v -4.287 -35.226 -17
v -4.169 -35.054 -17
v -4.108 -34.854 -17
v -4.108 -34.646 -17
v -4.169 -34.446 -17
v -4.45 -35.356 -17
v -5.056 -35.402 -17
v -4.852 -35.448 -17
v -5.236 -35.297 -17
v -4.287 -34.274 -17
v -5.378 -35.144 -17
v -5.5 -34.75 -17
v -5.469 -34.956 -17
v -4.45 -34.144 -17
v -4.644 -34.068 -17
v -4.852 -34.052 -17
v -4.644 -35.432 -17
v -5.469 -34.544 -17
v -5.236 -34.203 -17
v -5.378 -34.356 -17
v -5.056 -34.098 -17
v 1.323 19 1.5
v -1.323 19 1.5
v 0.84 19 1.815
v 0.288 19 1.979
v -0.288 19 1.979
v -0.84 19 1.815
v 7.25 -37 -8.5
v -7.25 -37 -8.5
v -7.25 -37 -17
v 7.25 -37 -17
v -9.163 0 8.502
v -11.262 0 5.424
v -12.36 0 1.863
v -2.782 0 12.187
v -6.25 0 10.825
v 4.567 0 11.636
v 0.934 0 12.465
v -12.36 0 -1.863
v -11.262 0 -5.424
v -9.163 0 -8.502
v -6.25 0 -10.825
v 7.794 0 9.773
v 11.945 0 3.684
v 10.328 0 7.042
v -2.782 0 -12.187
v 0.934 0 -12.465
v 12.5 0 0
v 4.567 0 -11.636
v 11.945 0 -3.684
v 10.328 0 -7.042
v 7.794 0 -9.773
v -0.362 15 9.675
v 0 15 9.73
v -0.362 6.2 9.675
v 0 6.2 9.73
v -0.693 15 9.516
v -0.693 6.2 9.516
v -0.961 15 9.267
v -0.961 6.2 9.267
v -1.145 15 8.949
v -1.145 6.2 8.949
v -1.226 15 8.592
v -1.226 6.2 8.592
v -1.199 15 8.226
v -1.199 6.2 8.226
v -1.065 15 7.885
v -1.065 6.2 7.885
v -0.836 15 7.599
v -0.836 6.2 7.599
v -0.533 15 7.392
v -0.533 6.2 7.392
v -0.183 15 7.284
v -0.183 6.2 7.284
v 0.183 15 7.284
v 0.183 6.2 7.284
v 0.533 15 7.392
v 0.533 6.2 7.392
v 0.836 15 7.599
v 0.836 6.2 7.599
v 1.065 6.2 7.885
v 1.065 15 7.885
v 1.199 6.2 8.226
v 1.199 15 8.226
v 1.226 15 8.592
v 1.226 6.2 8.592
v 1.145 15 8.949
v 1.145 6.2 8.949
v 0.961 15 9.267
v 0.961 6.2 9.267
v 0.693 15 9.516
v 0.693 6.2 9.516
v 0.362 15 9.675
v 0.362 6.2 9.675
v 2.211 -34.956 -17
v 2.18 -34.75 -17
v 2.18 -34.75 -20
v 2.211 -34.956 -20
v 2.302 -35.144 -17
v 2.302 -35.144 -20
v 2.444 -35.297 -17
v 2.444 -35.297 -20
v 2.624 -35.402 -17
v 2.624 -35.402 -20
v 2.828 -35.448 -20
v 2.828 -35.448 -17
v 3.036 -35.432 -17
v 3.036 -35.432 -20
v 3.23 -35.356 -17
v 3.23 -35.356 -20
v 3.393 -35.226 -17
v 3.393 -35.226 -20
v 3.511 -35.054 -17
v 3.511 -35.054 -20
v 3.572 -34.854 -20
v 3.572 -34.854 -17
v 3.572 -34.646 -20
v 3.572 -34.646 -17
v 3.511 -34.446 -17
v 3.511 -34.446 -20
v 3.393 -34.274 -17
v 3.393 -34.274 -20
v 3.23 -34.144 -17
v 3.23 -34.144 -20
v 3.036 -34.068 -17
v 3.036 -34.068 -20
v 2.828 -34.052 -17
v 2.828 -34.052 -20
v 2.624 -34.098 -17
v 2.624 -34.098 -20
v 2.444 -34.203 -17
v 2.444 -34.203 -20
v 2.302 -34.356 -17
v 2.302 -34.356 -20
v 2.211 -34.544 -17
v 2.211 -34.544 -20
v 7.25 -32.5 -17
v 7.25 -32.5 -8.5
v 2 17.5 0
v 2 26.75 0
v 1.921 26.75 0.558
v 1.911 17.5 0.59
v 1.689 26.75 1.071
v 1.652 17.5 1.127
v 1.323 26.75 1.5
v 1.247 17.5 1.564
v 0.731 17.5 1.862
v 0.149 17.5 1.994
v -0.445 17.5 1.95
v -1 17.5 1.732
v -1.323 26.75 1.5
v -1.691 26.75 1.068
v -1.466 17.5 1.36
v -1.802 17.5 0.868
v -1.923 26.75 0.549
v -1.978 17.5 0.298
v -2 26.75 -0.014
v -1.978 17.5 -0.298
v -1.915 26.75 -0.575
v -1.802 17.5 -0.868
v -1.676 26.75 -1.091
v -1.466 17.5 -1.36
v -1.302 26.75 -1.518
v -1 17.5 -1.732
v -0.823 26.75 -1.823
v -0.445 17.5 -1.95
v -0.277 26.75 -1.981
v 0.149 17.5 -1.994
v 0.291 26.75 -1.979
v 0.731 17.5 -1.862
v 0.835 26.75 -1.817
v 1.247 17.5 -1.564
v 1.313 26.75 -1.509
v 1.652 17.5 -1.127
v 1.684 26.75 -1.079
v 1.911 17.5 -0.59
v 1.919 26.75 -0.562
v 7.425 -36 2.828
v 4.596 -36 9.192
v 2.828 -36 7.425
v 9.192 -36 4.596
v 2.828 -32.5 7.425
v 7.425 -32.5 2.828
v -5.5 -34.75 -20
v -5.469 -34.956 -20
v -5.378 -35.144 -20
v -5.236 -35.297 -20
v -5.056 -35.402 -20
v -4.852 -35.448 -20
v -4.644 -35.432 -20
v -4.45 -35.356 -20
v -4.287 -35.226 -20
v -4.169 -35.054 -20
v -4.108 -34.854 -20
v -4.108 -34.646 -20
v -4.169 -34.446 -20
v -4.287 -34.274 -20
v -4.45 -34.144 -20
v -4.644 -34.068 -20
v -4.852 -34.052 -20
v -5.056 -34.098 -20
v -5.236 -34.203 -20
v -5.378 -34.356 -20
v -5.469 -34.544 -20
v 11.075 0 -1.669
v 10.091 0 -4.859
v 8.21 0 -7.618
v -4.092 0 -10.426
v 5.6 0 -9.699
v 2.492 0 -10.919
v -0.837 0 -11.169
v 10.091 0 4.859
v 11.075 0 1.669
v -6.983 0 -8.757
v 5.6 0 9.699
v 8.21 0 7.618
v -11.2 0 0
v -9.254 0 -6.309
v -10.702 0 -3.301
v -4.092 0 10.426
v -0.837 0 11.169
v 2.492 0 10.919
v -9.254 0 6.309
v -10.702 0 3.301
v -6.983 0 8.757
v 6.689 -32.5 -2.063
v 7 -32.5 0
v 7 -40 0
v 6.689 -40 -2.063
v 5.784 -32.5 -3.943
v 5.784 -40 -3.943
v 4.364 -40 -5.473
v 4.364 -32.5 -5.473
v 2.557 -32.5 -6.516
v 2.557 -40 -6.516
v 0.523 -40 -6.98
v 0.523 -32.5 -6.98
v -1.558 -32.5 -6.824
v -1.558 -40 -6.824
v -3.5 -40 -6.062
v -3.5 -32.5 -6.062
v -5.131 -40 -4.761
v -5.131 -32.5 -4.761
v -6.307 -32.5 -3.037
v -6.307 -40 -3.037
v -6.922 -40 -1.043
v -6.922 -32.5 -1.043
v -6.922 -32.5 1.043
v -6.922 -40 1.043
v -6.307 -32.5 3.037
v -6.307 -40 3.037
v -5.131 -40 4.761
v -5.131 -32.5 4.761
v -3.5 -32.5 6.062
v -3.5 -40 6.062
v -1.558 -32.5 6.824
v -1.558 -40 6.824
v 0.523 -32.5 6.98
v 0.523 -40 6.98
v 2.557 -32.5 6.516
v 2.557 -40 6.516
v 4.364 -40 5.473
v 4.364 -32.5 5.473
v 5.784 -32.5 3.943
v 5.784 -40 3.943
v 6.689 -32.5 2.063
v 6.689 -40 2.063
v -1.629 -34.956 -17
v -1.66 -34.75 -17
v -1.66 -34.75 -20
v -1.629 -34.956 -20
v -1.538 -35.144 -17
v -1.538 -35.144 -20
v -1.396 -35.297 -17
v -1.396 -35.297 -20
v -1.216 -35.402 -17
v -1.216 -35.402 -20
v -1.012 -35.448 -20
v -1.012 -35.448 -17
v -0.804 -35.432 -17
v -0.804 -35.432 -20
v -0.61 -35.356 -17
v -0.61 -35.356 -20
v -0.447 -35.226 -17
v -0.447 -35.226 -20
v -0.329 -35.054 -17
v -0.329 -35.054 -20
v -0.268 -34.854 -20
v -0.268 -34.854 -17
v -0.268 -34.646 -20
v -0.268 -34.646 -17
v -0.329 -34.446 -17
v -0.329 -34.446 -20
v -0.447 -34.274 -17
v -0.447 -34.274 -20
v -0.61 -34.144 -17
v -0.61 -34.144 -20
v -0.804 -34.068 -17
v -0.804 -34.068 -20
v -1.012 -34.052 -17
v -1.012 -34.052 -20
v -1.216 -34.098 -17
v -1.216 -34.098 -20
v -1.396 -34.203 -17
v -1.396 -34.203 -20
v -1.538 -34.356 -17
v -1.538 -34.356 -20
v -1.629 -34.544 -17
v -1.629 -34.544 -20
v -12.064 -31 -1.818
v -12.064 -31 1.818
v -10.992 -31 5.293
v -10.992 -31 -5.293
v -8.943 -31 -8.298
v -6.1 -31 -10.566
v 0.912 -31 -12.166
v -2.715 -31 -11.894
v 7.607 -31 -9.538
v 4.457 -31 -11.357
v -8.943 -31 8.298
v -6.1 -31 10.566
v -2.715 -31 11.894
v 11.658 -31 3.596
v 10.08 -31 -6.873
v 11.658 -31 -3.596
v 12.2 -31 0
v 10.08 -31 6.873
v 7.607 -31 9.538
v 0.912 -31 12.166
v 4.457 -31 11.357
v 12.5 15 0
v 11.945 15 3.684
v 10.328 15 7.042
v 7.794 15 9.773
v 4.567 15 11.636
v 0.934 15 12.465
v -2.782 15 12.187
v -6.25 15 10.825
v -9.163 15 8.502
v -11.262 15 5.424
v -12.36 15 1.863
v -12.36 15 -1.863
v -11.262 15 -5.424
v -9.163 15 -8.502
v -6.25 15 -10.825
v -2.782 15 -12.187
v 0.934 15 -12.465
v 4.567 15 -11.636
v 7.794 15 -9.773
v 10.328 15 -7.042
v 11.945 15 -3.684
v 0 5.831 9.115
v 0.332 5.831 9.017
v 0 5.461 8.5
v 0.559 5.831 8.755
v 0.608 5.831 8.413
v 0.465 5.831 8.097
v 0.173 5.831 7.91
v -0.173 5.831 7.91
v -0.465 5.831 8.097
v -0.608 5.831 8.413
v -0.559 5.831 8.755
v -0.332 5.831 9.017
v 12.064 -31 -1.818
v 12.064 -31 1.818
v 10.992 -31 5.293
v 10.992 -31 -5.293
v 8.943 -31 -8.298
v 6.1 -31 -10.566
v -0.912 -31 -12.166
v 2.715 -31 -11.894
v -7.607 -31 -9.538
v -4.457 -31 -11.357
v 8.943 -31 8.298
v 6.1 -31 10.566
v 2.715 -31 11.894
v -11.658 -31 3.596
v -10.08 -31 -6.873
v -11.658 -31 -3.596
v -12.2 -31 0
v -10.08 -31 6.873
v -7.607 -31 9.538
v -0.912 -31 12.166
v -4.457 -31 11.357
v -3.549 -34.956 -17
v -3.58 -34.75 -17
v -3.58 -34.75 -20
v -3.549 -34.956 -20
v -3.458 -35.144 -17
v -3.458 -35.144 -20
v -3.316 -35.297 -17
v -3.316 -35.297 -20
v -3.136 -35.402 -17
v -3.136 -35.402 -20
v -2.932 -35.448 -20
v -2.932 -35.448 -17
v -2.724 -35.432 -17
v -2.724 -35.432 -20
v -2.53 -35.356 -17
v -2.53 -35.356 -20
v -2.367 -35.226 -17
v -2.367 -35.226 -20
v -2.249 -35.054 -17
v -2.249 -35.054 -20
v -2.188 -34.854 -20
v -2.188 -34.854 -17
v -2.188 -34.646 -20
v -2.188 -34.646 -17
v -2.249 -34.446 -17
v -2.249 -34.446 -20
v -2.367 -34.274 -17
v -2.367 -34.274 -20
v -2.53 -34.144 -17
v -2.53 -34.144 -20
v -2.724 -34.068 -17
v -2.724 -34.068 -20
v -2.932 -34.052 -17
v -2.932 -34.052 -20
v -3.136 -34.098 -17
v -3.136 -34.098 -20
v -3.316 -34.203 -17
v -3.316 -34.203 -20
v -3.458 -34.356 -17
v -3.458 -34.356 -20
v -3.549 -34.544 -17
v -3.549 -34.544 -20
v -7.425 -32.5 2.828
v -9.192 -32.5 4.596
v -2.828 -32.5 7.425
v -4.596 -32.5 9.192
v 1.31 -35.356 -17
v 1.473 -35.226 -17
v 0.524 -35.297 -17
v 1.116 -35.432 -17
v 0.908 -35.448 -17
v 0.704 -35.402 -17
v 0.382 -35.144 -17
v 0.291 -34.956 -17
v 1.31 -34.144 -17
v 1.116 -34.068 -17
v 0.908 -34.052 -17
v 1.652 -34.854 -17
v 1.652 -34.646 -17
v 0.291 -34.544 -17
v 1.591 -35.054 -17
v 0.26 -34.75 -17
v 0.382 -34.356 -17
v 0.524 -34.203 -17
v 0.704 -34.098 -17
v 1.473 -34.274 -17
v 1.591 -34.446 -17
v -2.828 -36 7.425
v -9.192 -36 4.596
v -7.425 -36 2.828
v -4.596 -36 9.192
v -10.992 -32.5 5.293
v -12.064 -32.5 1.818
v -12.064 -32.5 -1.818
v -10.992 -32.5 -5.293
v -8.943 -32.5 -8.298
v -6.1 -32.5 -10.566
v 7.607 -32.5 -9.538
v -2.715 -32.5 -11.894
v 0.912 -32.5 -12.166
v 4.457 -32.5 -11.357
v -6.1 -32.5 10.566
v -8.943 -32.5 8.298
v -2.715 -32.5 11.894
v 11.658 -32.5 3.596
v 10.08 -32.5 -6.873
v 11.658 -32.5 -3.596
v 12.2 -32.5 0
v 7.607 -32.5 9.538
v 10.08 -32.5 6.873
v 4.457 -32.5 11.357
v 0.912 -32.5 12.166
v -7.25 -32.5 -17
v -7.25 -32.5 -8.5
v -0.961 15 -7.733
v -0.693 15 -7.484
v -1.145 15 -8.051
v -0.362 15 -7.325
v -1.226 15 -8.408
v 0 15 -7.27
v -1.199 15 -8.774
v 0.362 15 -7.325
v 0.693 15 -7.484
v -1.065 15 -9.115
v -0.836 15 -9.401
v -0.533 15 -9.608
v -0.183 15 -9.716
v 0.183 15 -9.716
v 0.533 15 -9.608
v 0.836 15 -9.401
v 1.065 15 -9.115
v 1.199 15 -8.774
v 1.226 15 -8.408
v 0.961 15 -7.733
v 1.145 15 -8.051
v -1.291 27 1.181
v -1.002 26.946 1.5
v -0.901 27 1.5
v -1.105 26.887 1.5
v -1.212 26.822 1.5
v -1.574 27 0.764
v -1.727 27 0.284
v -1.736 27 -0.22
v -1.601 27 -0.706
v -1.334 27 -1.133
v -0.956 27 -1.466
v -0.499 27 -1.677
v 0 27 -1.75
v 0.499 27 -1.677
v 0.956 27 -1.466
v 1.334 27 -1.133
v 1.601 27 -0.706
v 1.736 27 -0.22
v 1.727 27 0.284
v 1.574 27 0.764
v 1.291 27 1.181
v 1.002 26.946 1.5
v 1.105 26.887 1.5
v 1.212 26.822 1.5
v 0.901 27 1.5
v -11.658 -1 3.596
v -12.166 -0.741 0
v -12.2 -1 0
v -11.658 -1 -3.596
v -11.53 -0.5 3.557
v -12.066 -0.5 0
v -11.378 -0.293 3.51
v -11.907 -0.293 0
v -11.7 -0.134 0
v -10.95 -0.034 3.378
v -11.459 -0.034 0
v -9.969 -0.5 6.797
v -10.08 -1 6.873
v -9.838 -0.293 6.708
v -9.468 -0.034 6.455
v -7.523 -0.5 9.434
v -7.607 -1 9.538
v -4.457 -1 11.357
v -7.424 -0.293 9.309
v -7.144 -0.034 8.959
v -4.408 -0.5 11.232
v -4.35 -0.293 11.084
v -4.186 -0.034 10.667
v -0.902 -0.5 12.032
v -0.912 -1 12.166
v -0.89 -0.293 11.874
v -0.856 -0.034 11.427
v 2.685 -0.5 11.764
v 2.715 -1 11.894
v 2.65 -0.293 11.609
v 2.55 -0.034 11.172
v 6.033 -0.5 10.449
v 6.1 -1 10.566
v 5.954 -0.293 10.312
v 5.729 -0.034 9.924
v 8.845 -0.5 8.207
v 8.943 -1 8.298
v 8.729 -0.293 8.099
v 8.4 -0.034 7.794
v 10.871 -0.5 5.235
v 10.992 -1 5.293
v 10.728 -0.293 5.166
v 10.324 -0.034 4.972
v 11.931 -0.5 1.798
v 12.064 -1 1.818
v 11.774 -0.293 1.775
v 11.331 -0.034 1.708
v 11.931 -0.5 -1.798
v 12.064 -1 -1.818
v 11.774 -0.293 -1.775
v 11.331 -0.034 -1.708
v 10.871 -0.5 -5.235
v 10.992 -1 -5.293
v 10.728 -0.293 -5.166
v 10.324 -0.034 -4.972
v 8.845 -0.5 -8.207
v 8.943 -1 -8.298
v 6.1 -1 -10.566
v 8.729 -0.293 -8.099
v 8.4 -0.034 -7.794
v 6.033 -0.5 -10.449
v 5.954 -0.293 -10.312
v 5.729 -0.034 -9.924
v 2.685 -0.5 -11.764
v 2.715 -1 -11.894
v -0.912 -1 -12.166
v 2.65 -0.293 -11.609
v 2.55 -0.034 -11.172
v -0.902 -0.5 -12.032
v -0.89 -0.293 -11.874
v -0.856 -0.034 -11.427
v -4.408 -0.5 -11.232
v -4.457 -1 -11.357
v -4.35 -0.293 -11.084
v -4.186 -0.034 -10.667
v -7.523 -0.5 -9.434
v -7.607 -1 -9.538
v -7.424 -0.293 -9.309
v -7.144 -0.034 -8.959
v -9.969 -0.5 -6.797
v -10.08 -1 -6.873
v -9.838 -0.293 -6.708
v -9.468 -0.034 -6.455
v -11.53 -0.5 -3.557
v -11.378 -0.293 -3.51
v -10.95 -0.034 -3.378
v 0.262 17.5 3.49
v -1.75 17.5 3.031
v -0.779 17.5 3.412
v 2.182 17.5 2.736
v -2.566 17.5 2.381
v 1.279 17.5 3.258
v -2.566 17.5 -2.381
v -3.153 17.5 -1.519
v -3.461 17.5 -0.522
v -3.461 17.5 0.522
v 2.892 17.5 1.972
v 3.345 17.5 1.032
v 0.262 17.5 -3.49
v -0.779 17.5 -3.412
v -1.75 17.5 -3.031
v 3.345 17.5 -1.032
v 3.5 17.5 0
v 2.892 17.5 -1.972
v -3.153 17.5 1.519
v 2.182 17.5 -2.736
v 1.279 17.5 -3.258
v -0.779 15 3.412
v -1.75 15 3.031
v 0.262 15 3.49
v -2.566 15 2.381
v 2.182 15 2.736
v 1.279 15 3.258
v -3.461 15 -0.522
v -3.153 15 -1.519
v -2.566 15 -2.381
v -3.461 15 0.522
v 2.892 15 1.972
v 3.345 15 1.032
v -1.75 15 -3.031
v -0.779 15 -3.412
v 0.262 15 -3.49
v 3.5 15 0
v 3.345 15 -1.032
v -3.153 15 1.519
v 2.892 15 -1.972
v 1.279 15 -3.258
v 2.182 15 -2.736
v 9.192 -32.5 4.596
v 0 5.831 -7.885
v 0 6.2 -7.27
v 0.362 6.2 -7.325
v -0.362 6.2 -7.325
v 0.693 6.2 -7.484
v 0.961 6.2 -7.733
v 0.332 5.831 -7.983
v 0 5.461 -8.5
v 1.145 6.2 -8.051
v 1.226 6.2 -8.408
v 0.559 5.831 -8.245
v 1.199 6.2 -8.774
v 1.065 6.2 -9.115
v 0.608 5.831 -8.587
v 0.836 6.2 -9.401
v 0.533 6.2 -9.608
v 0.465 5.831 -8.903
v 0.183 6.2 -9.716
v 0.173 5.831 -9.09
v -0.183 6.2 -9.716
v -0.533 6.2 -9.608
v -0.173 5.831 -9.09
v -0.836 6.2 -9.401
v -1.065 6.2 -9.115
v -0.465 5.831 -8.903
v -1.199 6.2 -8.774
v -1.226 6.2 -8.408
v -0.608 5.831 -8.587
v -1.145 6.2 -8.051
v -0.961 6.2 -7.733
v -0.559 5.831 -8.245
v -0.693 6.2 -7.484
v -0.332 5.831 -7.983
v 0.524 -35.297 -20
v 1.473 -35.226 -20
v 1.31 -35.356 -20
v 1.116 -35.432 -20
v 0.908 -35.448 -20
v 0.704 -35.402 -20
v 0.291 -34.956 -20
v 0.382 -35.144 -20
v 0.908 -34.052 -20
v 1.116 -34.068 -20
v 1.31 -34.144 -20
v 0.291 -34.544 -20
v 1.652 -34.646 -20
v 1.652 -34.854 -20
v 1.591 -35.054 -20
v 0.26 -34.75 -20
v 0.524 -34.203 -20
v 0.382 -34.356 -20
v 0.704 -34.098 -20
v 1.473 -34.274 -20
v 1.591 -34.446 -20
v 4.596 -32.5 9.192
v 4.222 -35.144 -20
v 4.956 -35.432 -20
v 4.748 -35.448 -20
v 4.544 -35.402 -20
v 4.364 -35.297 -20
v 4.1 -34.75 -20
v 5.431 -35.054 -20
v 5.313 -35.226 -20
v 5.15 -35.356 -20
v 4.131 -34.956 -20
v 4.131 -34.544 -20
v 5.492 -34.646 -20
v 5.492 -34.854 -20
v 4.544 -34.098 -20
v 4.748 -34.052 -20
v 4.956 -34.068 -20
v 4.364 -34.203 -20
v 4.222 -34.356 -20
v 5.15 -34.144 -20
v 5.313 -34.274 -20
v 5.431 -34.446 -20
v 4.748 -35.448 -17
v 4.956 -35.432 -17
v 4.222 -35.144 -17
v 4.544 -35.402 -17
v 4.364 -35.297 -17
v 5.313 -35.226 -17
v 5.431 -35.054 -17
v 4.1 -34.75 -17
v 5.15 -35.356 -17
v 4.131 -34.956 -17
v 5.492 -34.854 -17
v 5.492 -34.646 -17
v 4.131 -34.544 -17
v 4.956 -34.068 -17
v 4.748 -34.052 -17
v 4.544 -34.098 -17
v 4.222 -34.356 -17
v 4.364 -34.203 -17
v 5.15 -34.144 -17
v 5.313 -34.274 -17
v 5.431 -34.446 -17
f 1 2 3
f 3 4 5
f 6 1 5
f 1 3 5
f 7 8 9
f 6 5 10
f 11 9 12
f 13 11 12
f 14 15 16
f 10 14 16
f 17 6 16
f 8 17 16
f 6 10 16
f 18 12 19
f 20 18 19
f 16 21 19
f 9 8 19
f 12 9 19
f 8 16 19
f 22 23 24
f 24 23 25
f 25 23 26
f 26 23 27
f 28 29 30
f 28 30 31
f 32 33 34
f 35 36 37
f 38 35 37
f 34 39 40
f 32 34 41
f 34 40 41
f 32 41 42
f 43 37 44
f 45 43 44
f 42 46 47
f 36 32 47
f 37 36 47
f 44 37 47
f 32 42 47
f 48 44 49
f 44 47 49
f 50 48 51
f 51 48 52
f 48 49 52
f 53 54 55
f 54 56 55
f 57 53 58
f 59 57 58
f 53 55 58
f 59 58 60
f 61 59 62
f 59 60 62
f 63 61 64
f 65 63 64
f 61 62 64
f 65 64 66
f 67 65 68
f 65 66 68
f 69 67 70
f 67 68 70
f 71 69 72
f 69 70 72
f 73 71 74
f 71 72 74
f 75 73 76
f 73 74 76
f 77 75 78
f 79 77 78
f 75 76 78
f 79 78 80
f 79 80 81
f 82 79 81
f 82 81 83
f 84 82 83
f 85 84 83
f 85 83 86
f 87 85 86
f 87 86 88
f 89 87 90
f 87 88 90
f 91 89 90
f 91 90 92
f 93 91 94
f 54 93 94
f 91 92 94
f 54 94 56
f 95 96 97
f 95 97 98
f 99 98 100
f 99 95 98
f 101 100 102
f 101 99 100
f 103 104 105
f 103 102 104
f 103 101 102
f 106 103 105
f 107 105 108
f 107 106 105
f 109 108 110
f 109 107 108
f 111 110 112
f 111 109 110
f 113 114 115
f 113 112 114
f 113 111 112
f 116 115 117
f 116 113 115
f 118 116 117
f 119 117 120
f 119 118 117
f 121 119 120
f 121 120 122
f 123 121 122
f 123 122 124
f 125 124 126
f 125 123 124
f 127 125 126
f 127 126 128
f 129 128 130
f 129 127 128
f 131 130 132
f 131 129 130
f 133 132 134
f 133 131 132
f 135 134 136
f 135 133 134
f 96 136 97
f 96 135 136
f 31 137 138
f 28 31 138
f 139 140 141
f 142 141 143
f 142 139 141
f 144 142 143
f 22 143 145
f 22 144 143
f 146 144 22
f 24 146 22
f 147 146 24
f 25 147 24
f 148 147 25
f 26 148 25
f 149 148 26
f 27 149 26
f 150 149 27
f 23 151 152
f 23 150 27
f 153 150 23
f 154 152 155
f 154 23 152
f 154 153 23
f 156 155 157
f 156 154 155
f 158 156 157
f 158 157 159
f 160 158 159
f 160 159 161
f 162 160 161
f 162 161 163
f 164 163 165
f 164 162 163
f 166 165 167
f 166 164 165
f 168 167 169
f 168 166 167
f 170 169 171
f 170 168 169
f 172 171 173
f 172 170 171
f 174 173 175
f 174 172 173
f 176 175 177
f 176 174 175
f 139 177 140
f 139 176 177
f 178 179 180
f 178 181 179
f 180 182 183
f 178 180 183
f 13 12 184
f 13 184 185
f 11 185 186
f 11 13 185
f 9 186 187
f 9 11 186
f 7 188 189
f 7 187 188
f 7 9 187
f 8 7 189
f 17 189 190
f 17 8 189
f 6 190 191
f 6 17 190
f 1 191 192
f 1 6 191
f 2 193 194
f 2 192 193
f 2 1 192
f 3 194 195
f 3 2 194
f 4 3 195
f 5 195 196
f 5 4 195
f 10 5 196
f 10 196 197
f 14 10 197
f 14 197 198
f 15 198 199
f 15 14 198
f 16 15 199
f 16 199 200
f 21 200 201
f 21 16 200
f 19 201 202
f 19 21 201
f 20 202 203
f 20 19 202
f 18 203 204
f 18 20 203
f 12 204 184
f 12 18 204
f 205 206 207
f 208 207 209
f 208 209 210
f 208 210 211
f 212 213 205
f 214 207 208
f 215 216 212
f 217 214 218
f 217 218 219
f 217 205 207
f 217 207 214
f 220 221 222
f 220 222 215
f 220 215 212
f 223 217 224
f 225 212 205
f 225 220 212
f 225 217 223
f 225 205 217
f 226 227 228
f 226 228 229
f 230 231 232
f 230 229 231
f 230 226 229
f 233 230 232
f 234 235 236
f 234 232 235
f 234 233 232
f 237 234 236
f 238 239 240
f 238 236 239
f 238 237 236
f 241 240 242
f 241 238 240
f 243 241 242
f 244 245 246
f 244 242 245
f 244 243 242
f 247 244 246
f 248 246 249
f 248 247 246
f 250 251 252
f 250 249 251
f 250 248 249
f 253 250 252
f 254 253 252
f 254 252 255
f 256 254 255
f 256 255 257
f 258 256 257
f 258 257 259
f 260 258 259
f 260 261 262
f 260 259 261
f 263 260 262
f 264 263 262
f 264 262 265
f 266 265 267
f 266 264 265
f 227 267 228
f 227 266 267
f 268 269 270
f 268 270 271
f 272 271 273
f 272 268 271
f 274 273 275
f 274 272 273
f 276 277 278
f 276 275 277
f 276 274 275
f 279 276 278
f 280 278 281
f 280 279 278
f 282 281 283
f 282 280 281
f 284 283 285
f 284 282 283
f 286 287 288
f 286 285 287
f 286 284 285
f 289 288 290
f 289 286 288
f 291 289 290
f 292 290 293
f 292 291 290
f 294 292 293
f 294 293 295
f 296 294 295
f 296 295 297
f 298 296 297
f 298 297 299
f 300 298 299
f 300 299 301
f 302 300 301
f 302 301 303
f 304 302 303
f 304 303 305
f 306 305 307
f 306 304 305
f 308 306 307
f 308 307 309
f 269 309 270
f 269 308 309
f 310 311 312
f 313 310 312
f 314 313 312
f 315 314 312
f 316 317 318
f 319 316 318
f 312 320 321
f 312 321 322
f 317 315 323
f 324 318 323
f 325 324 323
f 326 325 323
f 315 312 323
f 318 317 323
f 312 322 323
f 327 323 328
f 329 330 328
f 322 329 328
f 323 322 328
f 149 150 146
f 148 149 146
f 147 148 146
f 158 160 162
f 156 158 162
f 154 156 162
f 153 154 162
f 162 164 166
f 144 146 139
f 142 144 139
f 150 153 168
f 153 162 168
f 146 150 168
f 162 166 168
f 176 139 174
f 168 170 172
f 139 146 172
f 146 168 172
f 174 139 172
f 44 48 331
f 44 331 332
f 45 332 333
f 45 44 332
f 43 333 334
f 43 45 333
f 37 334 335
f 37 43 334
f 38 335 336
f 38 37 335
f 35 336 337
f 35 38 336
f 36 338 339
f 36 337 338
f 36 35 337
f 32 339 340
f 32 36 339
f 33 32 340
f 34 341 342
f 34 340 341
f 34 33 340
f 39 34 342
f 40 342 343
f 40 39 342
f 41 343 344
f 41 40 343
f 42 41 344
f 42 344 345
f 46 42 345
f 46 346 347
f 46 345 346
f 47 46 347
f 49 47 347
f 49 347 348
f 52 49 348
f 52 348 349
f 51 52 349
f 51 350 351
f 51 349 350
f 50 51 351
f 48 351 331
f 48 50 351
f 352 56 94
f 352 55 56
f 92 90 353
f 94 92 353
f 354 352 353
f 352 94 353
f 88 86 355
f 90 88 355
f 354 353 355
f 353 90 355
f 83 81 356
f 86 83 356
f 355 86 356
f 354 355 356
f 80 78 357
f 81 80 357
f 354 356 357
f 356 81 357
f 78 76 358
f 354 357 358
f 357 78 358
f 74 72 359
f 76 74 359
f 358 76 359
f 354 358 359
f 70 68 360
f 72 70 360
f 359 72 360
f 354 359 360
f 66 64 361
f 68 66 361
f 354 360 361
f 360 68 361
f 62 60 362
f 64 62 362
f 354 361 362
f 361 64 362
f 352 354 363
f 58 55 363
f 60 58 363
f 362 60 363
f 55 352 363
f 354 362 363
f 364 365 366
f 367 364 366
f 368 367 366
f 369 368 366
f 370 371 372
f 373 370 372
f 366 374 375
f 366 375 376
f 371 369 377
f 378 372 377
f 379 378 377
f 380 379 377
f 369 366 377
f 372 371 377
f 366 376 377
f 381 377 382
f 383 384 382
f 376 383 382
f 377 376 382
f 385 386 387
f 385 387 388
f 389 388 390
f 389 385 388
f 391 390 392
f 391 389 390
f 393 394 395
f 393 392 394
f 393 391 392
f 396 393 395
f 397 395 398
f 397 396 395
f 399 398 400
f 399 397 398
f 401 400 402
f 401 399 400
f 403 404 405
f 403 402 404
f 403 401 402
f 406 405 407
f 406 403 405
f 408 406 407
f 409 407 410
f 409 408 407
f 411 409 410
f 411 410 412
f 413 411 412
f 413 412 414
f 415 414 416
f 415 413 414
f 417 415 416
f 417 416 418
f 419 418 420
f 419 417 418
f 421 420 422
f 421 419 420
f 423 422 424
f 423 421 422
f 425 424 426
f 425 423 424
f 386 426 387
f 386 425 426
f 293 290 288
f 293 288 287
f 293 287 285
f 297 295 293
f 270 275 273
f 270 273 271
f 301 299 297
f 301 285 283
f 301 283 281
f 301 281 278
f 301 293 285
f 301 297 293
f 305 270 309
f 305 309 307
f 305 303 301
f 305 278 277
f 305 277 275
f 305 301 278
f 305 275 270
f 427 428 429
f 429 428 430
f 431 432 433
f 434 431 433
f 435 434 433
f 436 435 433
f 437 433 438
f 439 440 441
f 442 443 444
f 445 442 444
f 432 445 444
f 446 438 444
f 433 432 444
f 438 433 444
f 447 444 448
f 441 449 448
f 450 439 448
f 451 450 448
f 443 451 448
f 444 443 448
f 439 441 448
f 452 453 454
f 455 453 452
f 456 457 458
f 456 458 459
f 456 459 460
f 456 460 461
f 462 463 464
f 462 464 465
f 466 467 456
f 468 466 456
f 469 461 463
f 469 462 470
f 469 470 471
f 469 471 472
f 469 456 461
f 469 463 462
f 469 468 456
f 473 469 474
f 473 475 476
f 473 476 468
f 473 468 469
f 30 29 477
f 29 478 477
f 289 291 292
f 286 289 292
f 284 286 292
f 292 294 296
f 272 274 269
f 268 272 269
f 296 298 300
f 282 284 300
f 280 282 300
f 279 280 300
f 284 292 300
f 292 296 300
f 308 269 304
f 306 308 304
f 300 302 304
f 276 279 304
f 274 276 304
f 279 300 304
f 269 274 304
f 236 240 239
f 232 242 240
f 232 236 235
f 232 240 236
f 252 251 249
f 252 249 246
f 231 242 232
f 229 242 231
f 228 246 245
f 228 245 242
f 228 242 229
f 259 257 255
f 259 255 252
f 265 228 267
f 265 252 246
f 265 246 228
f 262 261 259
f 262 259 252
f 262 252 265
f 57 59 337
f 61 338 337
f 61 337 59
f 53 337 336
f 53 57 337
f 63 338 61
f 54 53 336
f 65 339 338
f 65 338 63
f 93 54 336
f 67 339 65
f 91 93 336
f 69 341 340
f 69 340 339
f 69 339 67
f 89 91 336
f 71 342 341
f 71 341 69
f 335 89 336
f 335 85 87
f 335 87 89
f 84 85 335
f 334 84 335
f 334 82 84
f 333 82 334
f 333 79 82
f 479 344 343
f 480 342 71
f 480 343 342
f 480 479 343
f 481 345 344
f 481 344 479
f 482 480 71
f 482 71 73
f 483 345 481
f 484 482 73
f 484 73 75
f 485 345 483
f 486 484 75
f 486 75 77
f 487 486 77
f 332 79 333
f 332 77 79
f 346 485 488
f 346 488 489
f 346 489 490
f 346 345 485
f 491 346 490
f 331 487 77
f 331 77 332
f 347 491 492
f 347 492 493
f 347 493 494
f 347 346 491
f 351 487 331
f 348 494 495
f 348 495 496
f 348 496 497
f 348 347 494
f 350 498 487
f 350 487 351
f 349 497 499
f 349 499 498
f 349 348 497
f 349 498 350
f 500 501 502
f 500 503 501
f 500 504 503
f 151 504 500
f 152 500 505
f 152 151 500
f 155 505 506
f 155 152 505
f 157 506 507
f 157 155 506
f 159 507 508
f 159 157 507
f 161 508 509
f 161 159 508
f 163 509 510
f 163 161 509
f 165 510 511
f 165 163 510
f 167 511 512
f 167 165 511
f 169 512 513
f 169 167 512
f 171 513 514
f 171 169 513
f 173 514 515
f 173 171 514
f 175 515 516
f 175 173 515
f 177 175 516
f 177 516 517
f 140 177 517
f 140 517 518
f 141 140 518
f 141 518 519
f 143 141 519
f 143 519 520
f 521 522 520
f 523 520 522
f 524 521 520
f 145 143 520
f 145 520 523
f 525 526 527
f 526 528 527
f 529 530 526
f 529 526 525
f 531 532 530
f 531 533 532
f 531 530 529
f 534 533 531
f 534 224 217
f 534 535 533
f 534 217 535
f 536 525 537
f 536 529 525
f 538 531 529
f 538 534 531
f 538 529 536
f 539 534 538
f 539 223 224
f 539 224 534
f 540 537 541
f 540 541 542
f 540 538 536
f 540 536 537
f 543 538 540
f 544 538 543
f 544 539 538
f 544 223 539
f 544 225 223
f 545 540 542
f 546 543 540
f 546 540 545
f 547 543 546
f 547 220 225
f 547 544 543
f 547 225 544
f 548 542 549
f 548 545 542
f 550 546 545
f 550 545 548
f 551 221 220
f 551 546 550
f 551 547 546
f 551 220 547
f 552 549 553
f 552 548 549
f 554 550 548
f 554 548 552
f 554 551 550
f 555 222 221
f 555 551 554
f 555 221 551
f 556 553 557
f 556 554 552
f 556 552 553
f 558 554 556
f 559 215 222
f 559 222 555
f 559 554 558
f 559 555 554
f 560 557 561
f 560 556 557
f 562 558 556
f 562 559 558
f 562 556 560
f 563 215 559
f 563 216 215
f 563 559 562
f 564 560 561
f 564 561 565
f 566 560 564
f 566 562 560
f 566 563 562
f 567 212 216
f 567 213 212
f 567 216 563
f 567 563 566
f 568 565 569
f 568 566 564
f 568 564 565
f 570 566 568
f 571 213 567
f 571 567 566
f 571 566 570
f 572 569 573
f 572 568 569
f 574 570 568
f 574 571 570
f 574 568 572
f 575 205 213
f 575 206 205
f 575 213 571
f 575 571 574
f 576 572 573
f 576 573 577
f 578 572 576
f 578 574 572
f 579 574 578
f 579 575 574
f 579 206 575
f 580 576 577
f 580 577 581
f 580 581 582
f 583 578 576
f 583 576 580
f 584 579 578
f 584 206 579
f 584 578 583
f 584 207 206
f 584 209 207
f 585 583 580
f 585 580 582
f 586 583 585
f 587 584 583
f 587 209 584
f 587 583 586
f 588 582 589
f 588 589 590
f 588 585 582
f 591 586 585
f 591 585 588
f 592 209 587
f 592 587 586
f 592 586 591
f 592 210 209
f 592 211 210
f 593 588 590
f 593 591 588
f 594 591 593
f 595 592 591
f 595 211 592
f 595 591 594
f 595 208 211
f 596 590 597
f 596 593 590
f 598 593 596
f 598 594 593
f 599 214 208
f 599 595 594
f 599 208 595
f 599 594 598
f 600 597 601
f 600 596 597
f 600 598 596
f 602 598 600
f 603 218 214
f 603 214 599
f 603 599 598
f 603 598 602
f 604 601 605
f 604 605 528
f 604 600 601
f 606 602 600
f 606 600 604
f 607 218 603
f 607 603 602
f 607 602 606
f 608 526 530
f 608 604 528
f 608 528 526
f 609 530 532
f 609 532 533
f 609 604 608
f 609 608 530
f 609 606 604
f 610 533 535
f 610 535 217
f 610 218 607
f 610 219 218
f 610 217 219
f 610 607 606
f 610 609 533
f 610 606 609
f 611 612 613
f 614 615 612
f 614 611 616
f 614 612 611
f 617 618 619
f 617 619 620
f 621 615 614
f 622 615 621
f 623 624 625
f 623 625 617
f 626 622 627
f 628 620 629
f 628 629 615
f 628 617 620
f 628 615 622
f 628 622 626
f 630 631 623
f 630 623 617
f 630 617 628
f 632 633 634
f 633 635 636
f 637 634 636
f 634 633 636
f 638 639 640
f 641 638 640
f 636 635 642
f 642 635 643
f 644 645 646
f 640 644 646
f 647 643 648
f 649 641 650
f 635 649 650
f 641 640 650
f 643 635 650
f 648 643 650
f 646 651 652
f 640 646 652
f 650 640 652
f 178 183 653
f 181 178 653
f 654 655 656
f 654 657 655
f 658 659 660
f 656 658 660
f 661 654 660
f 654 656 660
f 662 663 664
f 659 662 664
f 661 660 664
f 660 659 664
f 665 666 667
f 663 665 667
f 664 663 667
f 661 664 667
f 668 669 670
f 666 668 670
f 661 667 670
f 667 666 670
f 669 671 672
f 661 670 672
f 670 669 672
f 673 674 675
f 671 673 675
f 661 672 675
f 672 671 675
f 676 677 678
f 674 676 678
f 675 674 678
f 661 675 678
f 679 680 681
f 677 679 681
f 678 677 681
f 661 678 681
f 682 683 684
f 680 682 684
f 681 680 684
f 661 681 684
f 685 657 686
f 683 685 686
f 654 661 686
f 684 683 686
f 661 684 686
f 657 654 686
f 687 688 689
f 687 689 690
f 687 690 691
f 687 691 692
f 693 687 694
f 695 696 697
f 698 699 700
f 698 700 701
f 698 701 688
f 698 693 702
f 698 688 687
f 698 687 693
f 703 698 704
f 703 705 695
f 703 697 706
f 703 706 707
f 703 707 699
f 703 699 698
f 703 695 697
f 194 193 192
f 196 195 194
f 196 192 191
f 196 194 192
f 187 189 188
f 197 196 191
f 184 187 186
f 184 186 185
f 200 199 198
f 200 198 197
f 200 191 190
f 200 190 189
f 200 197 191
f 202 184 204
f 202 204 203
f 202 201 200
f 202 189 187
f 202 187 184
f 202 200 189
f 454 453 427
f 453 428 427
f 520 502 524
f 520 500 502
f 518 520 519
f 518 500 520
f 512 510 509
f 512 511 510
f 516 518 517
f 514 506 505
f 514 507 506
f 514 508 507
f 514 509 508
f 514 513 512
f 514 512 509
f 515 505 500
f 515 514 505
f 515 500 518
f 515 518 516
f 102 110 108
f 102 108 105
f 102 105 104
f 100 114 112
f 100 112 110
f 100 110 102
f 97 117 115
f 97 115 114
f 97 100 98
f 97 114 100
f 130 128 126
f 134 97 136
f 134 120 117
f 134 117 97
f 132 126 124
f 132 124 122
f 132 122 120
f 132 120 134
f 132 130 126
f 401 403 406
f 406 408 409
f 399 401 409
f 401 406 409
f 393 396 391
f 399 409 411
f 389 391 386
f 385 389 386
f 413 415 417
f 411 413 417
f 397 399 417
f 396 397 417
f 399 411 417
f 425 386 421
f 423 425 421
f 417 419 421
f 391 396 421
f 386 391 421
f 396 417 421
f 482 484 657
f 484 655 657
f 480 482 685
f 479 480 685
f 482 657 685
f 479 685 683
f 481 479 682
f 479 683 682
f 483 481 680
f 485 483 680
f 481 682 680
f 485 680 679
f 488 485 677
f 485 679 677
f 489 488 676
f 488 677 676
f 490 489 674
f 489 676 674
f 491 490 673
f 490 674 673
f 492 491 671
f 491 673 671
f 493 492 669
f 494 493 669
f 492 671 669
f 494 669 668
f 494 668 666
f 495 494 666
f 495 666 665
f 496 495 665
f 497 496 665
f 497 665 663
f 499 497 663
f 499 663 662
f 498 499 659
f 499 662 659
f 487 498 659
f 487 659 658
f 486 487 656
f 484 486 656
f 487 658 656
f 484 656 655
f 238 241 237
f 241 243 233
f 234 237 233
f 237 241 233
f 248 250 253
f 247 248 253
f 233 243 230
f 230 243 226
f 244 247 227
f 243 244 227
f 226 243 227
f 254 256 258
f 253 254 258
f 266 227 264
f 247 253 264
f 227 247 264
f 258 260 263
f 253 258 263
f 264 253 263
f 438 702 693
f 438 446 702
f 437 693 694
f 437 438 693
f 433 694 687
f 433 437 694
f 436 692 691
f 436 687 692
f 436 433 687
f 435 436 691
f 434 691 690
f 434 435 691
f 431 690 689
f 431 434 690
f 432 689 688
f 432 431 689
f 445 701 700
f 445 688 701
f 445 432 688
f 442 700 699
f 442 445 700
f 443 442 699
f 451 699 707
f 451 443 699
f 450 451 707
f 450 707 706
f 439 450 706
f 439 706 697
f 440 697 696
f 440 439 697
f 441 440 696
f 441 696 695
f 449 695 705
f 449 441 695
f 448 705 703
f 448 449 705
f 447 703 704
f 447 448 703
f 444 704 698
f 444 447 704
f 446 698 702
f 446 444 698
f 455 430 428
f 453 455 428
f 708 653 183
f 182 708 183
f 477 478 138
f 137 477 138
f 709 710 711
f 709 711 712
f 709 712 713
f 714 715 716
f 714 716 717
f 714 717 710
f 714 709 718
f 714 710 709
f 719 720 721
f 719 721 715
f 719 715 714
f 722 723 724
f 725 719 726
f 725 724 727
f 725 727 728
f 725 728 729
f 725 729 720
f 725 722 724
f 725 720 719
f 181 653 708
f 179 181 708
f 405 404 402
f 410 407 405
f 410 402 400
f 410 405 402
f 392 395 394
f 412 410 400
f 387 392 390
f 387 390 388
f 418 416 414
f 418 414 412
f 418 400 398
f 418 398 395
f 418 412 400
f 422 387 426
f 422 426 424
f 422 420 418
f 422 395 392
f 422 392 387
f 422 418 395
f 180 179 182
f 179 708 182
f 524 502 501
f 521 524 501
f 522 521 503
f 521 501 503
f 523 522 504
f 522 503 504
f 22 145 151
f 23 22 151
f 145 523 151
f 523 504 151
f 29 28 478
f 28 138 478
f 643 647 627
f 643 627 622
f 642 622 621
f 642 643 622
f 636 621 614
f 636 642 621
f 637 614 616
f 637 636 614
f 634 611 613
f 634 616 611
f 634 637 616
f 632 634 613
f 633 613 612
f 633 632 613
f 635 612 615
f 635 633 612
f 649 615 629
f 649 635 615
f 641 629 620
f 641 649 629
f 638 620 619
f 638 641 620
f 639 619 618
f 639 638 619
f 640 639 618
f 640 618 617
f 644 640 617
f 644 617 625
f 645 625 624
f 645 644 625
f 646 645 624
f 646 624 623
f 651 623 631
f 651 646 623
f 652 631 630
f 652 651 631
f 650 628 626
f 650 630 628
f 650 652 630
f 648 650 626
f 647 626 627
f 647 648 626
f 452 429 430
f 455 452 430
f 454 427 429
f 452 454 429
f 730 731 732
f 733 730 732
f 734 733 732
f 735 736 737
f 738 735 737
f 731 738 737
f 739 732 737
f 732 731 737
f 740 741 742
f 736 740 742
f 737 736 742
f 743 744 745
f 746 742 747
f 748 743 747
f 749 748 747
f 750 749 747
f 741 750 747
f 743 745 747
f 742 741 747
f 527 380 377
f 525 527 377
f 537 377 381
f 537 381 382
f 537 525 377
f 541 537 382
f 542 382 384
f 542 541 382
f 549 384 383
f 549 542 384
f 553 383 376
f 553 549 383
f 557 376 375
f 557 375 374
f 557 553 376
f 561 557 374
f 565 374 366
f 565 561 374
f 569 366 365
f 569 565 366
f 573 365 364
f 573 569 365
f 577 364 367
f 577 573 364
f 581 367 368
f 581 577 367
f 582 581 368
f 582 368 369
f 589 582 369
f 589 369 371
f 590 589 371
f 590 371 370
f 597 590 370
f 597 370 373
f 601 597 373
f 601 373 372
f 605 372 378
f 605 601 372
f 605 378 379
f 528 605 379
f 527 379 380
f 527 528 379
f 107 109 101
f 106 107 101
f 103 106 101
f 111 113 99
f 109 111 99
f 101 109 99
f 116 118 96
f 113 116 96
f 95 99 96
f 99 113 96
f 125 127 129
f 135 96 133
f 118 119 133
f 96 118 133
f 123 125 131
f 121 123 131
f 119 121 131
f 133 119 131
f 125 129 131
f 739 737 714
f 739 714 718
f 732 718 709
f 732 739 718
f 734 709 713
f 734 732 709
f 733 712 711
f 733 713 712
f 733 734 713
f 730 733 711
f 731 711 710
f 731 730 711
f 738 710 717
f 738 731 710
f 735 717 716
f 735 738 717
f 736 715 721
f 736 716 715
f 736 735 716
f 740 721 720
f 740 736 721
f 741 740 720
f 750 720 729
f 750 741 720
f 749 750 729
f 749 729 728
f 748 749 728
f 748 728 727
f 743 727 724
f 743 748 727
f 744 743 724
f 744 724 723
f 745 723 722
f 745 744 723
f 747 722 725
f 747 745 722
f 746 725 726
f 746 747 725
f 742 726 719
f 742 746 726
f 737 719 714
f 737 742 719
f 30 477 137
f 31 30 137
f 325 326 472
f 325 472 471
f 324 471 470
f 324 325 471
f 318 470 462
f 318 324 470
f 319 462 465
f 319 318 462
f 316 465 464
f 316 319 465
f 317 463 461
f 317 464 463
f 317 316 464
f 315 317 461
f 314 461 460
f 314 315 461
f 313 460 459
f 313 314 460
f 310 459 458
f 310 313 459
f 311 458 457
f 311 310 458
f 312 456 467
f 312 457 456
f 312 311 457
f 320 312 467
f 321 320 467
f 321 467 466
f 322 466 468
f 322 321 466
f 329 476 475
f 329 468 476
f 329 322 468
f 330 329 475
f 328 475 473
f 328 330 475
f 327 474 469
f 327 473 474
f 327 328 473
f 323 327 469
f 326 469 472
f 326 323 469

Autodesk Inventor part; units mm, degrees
ref_plane "YZ Plane" through (0, 0, 0) normal (1, 0, 0) x (0, 1, 0)
ref_plane "XZ Plane" through (0, 0, 0) normal (0, 1, 0) x (-1, 0, 0)
ref_plane "XY Plane" through (0, 0, 0) normal (0, 0, 1) x (1, 0, 0)
sketch "Sketch1" plane through (0, 0, 0) normal (0, 1, 0) x (-1, 0, 0)
  circle A0 centre (0, 0) radius 12.2
  dimension "d0" = 24.4
extrude "Extrusion1" add sketch "Sketch1" against normal blind 31
fillet "Fillet1" radius 1 1 edges at (12.2, 0, 0)
sketch "Sketch2" plane through (0, -31, 0) normal (0, -1, 0) x (1, 0, 0)
  circle A0 centre (0, 0) radius 12.2 projected
extrude "Extrusion2" add sketch "Sketch2" along normal blind 1.5 separate body
sketch "Sketch3" plane through (0, -32.5, 0) normal (0, -1, 0) x (1, 0, 0)
  circle A0 centre (0, 0) radius 7
  dimension "d6" = 14
extrude "Extrusion3" add sketch "Sketch3" along normal blind 7.5 separate body
sketch "Sketch4" plane through (0, -32.5, 0) normal (0, -1, 0) x (1, 0, 0)
  circle A0 centre (0, 0) radius 6.75 construction
  line L0 (-7.4246, 2.8284) -> (-2.8284, 7.4246)
  line L1 (-2.8284, 7.4246) -> (-4.5962, 9.1924)
  line L2 (-4.5962, 9.1924) -> (-9.1924, 4.5962)
  line L3 (-9.1924, 4.5962) -> (-7.4246, 2.8284)
  line L4 (-7.4246, 2.8284) -> (-4.5962, 9.1924) construction
  line L5 (-2.8284, 7.4246) -> (-9.1924, 4.5962) construction
  line L6 (0, 0) -> (-6.0104, 6.0104) construction
  line L7 (0, 0) -> (-12.2, 0) construction
  circle A1 centre (0, 0) radius 12.2 construction
  point P0 (4.773, -4.773)
  dimension "d9" = 13.5
  dimension "d10" = 6.5
  dimension "d11" = 2.5
  dimension "d12" = 45
  dimension "d13" = 16.5
extrude "Extrusion4" add sketch "Sketch4" along normal blind 3.5 separate body
pattern_circular "Circular Pattern1" count 2 over 90 about axis through (0, -32.5, 0) along (0, 1, 0) of "Extrusion4" bodies 4
sketch "Sketch5" plane through (0, -32.5, 0) normal (0, -1, 0) x (1, 0, 0)
  line L0 (-7.25, -17) -> (7.25, -17)
  line L1 (7.25, -17) -> (7.25, -8.5)
  line L2 (7.25, -8.5) -> (-7.25, -8.5)
  line L3 (-7.25, -8.5) -> (-7.25, -17)
  line L4 (-7.25, -17) -> (7.25, -8.5) construction
  line L5 (7.25, -17) -> (-7.25, -8.5) construction
  circle A0 centre (0, 0) radius 7 projected
  point P0 (0, -12.75)
  point P1 (0, -12.75)
  dimension "d19" = 17
  dimension "d20" = 8.5
  dimension "d21" = 14.5
extrude "Extrusion5" add sketch "Sketch5" along normal blind 4.5 separate body contours L3 L2 L1 L0
sketch "Sketch6" plane through (7.25, -32.5, -17) normal (0, 0, -1) x (-1, 0, 0)
  line L0 (12.05, -2.25) -> (10.13, -2.25) construction
  line L1 (10.13, -2.25) -> (8.21, -2.25) construction
  line L2 (8.21, -2.25) -> (6.29, -2.25) construction
  line L3 (6.29, -2.25) -> (4.37, -2.25) construction
  line L4 (4.37, -2.25) -> (2.45, -2.25) construction
  circle A0 centre (12.05, -2.25) radius 0.7
  circle A1 centre (10.13, -2.25) radius 0.7
  circle A2 centre (8.21, -2.25) radius 0.7
  circle A3 centre (6.29, -2.25) radius 0.7
  circle A4 centre (4.37, -2.25) radius 0.7
  circle A5 centre (2.45, -2.25) radius 0.7
  line L5 (14.5, 0) -> (14.5, -4.5) projected
  line L6 (14.5, -4.5) -> (0, -4.5) projected
  point P0 (7.25, 32.5)
  point P1 (14.5, -2.25)
  point P2 (7.25, -2.25)
  point P3 (7.25, -4.5)
  dimension "d24" = 9.6
  dimension "d25" = 1.4
extrude "Extrusion6" add sketch "Sketch6" along normal blind 3 separate body contours A0
extrude "Extrusion7" add sketch "Sketch6" along normal blind 3 separate body contours A1
extrude "Extrusion8" add sketch "Sketch6" along normal blind 3 separate body contours A2
extrude "Extrusion9" add sketch "Sketch6" along normal blind 3 separate body contours A3
extrude "Extrusion10" add sketch "Sketch6" along normal blind 3 separate body contours A4
extrude "Extrusion11" add sketch "Sketch6" along normal blind 3 separate body contours A5
sketch "Sketch7" plane through (0, 0, 0) normal (0, 1, 0) x (1, 0, 0)
  circle A0 centre (0, 0) radius 12.5
  dimension "d38" = 25
extrude "Extrusion12" add sketch "Sketch7" along normal blind 15 separate body
sketch "Sketch8" plane through (0, 15, 0) normal (0, 1, 0) x (1, 0, 0)
  circle A0 centre (0, 0) radius 11.2 construction
  circle A1 centre (0, 0) radius 3.5
  dimension "d41" = 7
extrude "Extrusion13" add sketch "Sketch8" along normal blind 2.5 separate body
sketch "Sketch9" plane through (0, 17.5, 0) normal (0, 1, 0) x (1, 0, 0)
  circle A0 centre (0, 0) radius 2
  dimension "d44" = 4
extrude "Extrusion14" add sketch "Sketch9" along normal blind 9.5 separate body
chamfer "Chamfer1" distance 0.25 angle 45 1 edges at (-2, 27, 0)
sketch "Sketch10" plane through (0, 27, 0) normal (0, 1, 0) x (1, 0, 0)
  line L0 (-1.3229, -2) -> (1.3229, -2)
  line L1 (1.3229, -2) -> (1.3229, -1.5)
  line L2 (1.3229, -1.5) -> (-1.3229, -1.5)
  line L3 (-1.3229, -1.5) -> (-1.3229, -2)
  circle A0 centre (0, 0) radius 2 construction
  dimension "d50" = 1.5
extrude "Extrusion15" cut sketch "Sketch10" against normal blind 8 bodies 14
sketch "Sketch11" plane through (0, 15, 0) normal (0, 1, 0) x (1, 0, 0)
  circle A0 centre (0, 0) radius 12.5 construction
  line L0 (0, 8.5) -> (0, -8.5) construction
  line L1 (7.25, 8.5) -> (-7.25, 8.5) construction
  dimension "d53" = 17
hole "Hole1" at (0, 15, -8.5) at (0, 15, 8.5) direction (0, -1, 0) diameter 2.459 depth 8.8 tip angle 118 bodies 12 thread size "M3x0.5" class "6H" standard "ISO Metric profile"
properties part number "JGA25-371_12VDC_105RPM"
